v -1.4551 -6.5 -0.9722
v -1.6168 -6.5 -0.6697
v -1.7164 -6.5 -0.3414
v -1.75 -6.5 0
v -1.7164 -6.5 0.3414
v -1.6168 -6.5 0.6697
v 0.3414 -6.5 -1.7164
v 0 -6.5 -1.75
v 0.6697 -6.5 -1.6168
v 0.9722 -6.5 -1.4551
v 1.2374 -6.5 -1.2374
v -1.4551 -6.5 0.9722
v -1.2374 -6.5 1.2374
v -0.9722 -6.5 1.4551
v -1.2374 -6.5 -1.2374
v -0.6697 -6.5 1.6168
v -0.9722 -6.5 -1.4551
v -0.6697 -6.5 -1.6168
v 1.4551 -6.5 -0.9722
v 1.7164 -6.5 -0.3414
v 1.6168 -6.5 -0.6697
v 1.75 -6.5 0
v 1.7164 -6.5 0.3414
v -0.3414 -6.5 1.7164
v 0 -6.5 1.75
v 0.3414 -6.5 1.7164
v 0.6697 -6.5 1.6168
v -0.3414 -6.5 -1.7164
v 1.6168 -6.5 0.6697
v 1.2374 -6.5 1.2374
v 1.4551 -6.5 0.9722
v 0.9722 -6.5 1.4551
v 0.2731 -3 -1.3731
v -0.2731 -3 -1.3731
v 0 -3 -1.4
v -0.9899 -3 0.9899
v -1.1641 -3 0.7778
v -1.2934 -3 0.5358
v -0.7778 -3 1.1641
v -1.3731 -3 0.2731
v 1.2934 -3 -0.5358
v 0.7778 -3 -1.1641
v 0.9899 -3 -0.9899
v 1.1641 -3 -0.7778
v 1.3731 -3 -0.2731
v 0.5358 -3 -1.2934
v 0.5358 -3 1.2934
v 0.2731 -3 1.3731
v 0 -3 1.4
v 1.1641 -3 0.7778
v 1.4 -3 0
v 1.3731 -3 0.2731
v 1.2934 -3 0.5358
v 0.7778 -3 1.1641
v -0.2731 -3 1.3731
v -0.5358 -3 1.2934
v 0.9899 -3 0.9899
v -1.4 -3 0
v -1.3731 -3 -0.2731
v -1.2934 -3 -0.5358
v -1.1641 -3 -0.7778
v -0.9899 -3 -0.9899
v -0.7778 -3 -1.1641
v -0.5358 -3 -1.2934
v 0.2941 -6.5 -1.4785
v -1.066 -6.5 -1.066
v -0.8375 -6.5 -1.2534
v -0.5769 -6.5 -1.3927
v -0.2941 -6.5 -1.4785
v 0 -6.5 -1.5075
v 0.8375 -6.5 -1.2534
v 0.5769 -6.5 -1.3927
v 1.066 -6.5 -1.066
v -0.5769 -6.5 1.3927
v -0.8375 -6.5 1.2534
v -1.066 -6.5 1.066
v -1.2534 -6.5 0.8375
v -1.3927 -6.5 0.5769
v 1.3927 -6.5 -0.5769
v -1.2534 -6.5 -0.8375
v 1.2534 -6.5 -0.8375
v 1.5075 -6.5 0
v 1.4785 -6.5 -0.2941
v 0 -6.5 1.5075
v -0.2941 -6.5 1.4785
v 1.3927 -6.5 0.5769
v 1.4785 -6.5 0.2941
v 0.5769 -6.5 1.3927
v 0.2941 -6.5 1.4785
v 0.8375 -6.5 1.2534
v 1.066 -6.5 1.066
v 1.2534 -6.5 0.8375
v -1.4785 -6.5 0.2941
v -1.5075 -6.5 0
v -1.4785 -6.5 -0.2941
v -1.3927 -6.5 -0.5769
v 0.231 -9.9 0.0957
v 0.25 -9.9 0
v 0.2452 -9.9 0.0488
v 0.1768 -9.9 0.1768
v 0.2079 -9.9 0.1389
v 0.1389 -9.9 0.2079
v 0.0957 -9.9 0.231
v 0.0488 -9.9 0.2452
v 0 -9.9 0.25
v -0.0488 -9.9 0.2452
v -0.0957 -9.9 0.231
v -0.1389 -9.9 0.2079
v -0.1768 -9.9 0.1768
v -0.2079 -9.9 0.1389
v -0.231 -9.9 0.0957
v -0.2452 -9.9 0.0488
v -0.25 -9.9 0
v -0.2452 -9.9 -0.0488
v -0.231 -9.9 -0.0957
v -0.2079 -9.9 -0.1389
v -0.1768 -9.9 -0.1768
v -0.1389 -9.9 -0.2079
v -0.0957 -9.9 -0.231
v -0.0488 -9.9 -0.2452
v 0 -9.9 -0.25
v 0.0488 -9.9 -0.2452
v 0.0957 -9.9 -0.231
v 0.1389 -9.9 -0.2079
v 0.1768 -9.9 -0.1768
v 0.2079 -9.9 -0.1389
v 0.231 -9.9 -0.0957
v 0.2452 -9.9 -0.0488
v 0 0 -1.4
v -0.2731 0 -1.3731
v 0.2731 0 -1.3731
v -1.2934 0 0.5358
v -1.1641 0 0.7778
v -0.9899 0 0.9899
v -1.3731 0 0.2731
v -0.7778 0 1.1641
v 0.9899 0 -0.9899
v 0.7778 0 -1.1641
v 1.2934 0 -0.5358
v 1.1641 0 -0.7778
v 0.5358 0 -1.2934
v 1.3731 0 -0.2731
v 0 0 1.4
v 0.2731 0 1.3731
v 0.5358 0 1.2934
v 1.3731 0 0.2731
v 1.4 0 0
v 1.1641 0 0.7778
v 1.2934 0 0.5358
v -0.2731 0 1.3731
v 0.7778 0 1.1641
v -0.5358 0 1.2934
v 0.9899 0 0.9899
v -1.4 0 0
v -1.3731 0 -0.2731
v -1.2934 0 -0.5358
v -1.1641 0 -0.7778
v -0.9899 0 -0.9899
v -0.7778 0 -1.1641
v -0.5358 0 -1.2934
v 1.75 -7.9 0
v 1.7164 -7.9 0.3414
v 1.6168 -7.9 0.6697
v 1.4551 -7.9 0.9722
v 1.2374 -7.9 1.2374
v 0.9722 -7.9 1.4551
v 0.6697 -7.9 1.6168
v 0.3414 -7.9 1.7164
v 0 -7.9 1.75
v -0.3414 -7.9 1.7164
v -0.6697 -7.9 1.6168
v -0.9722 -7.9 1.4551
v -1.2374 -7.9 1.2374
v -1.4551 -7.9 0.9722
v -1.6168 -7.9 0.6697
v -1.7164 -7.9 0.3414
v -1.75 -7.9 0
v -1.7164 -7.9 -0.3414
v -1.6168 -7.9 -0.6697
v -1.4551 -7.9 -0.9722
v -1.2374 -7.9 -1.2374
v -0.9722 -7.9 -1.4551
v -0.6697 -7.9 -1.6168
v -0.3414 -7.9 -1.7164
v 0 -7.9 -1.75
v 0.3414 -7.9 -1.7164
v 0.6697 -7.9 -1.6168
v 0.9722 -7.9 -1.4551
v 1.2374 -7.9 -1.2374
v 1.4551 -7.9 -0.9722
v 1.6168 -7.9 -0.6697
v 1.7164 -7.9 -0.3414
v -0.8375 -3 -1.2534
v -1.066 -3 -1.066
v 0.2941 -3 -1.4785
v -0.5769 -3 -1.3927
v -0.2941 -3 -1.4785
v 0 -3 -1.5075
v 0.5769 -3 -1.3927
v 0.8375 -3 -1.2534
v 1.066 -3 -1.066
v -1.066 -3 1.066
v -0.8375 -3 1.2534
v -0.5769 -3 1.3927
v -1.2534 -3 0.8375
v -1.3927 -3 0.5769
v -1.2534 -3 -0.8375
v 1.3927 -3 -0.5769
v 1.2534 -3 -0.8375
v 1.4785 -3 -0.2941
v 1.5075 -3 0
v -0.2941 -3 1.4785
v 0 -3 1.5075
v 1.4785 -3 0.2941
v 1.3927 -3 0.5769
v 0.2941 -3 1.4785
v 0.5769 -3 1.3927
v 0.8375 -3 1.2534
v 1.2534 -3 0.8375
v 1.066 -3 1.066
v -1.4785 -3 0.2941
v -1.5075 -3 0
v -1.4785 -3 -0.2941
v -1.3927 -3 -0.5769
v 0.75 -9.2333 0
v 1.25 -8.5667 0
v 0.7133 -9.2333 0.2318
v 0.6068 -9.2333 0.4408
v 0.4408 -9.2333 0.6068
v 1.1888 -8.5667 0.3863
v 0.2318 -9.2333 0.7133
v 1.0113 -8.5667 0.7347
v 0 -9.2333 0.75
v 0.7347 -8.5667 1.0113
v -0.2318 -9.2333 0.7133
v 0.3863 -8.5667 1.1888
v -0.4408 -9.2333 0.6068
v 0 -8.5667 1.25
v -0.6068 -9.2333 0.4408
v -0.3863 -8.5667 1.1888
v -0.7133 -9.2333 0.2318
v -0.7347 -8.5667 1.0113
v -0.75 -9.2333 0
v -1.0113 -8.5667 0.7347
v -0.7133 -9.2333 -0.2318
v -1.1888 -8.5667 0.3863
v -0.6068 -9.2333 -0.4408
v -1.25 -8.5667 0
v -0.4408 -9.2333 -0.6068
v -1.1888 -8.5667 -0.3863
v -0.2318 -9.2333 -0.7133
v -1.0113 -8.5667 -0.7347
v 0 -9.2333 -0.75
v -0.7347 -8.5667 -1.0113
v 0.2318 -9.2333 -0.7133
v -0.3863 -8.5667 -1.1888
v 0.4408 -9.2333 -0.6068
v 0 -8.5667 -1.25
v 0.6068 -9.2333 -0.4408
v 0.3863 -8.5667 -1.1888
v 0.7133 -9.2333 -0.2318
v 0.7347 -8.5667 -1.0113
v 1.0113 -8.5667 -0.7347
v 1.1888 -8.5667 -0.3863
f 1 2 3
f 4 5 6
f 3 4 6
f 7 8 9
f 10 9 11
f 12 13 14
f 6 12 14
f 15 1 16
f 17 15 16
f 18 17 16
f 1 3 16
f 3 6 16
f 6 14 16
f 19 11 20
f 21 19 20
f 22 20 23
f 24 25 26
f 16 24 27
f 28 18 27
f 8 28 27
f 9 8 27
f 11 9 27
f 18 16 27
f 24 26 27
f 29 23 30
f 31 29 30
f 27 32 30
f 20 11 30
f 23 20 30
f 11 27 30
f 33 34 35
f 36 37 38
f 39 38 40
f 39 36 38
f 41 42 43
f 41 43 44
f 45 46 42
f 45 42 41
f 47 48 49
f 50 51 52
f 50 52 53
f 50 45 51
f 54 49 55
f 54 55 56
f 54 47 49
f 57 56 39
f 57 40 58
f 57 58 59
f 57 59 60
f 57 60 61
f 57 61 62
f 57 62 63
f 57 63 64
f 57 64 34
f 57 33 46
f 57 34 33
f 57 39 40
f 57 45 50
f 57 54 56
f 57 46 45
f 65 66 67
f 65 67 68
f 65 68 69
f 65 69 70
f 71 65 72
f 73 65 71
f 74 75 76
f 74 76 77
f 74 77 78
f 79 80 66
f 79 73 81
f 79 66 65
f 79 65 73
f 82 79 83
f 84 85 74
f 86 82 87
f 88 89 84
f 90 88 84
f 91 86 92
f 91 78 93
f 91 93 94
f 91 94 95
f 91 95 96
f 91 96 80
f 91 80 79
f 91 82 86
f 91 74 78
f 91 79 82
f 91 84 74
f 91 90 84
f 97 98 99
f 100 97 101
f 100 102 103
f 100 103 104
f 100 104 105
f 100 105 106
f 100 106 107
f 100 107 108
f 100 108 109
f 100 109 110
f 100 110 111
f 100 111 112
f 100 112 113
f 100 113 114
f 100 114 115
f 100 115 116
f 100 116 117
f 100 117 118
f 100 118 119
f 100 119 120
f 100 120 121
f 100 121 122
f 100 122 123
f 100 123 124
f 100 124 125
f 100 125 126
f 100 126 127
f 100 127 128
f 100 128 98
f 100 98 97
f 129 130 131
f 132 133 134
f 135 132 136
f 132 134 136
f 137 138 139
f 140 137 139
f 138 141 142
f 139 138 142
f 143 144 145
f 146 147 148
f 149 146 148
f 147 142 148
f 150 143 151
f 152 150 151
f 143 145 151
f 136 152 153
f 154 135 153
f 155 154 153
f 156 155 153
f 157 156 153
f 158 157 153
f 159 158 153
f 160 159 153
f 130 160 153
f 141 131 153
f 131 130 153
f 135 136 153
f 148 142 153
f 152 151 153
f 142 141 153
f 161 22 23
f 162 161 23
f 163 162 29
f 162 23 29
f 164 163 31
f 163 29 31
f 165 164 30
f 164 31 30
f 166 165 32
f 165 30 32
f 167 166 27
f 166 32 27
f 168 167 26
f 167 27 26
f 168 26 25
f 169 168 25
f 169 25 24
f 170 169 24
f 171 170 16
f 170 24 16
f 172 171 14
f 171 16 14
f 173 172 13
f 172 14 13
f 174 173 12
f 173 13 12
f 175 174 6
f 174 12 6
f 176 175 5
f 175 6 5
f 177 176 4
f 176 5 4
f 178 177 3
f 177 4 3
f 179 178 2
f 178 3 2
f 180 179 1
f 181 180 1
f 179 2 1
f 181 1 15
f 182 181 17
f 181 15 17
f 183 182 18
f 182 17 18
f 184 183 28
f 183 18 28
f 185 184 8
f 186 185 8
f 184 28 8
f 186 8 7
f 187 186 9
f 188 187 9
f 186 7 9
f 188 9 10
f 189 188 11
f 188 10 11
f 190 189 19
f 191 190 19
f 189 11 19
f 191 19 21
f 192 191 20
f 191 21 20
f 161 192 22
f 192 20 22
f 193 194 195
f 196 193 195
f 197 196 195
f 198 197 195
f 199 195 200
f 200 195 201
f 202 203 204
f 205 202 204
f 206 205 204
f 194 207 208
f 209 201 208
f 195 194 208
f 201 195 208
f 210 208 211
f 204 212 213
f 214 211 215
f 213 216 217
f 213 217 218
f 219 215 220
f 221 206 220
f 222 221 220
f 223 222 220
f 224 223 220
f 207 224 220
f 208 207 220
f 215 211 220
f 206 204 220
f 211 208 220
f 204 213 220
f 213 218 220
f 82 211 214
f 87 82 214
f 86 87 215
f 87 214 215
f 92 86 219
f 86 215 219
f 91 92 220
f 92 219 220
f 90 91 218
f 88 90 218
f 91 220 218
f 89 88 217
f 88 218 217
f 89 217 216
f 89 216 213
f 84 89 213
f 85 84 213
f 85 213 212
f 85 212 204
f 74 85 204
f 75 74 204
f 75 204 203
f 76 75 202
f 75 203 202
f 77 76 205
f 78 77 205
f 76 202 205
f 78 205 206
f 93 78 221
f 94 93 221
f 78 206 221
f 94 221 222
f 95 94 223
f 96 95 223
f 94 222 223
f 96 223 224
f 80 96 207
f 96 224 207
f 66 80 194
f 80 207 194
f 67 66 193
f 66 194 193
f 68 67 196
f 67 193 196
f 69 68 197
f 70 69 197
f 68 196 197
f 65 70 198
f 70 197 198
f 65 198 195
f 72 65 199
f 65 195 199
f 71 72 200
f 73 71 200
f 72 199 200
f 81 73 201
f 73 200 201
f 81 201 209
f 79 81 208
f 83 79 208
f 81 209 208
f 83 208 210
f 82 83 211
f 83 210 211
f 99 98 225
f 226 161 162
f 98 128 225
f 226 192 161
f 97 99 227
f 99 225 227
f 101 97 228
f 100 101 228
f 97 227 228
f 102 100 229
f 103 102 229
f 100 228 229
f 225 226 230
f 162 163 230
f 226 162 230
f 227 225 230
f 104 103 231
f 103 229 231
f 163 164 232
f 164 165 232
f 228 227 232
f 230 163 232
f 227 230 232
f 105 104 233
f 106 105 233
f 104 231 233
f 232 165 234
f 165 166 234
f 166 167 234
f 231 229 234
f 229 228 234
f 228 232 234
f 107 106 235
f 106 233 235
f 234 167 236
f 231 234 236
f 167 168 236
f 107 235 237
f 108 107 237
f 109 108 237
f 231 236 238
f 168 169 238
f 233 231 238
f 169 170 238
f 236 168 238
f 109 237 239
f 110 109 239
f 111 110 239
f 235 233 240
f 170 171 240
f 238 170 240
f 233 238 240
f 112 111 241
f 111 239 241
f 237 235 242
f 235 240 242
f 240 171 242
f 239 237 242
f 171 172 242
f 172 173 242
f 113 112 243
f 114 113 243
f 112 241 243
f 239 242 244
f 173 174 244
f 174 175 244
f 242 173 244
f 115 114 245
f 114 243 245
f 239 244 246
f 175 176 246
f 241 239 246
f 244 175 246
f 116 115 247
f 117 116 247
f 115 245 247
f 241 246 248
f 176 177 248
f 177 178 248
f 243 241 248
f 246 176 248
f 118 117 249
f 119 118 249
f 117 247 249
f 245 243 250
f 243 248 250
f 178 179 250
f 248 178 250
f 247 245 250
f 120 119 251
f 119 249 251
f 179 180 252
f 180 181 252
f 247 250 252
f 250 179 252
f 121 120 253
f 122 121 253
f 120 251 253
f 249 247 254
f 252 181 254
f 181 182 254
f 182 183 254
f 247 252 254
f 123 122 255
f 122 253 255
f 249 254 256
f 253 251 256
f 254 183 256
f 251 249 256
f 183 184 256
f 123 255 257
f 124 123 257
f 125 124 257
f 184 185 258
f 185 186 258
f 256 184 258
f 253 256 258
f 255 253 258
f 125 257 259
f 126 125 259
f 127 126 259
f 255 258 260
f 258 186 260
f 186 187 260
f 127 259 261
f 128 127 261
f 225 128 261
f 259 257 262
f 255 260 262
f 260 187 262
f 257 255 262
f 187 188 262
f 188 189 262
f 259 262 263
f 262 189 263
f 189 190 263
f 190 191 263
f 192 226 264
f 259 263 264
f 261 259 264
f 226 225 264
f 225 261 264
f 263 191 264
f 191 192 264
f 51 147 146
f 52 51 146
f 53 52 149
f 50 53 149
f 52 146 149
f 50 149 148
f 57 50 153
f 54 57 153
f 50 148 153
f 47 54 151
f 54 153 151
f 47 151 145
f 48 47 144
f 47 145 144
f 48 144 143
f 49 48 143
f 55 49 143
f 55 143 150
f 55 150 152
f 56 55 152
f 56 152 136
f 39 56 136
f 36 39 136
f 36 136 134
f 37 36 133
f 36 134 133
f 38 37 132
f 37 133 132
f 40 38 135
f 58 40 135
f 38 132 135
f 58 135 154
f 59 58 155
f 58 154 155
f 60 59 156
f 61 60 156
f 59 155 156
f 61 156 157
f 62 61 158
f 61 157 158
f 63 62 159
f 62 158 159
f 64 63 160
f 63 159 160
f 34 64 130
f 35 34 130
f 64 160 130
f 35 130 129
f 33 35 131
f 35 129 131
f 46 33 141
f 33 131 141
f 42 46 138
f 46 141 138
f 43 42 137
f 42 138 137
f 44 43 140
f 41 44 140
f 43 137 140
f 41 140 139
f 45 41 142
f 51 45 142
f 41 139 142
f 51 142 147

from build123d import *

# Parameters (mm, degrees)
F0_R     = 1.4
F1_DEPTH = 3
F2_R     = 1.5075
F2_R_2   = 1.4
F3_DEPTH = 3.5
F4_R     = 1.75
F4_R_2   = 1.5075
F5_DEPTH = 3.4
F6_SIZE2 = 2
F6_SIZE  = 1.5


with BuildPart() as f1:
    # F0 (on Front) → F1 (new body)
    with BuildSketch(Plane.XZ):
        Circle(F0_R)
    extrude(amount=F1_DEPTH)


with BuildPart() as f3:
    # F2 (on face) → F3 (new body)
    with BuildSketch(Plane.XZ.offset(3)):
        Circle(F2_R)
        Circle(F2_R_2, mode=Mode.SUBTRACT)
        Circle(F2_R_2)
    extrude(amount=F3_DEPTH)


with BuildPart() as f5:
    # F4 (on face) → F5 (new body)
    with BuildSketch(Plane.XZ.offset(6.5)):
        Circle(F4_R)
        Circle(F4_R_2, mode=Mode.SUBTRACT)
        Circle(F4_R_2)
    extrude(amount=F5_DEPTH)

    # F6
    f6_edges = [f5.edges().sort_by_distance(p)[0] for p in [
        (-1.75, -9.9, 0),
    ]]
    f6_side = f5.faces().sort_by_distance((0, -9.9, 0))[0]
    chamfer(f6_edges, length=F6_SIZE, length2=F6_SIZE2, reference=f6_side)


solid = Compound([f1.part, f3.part, f5.part])
